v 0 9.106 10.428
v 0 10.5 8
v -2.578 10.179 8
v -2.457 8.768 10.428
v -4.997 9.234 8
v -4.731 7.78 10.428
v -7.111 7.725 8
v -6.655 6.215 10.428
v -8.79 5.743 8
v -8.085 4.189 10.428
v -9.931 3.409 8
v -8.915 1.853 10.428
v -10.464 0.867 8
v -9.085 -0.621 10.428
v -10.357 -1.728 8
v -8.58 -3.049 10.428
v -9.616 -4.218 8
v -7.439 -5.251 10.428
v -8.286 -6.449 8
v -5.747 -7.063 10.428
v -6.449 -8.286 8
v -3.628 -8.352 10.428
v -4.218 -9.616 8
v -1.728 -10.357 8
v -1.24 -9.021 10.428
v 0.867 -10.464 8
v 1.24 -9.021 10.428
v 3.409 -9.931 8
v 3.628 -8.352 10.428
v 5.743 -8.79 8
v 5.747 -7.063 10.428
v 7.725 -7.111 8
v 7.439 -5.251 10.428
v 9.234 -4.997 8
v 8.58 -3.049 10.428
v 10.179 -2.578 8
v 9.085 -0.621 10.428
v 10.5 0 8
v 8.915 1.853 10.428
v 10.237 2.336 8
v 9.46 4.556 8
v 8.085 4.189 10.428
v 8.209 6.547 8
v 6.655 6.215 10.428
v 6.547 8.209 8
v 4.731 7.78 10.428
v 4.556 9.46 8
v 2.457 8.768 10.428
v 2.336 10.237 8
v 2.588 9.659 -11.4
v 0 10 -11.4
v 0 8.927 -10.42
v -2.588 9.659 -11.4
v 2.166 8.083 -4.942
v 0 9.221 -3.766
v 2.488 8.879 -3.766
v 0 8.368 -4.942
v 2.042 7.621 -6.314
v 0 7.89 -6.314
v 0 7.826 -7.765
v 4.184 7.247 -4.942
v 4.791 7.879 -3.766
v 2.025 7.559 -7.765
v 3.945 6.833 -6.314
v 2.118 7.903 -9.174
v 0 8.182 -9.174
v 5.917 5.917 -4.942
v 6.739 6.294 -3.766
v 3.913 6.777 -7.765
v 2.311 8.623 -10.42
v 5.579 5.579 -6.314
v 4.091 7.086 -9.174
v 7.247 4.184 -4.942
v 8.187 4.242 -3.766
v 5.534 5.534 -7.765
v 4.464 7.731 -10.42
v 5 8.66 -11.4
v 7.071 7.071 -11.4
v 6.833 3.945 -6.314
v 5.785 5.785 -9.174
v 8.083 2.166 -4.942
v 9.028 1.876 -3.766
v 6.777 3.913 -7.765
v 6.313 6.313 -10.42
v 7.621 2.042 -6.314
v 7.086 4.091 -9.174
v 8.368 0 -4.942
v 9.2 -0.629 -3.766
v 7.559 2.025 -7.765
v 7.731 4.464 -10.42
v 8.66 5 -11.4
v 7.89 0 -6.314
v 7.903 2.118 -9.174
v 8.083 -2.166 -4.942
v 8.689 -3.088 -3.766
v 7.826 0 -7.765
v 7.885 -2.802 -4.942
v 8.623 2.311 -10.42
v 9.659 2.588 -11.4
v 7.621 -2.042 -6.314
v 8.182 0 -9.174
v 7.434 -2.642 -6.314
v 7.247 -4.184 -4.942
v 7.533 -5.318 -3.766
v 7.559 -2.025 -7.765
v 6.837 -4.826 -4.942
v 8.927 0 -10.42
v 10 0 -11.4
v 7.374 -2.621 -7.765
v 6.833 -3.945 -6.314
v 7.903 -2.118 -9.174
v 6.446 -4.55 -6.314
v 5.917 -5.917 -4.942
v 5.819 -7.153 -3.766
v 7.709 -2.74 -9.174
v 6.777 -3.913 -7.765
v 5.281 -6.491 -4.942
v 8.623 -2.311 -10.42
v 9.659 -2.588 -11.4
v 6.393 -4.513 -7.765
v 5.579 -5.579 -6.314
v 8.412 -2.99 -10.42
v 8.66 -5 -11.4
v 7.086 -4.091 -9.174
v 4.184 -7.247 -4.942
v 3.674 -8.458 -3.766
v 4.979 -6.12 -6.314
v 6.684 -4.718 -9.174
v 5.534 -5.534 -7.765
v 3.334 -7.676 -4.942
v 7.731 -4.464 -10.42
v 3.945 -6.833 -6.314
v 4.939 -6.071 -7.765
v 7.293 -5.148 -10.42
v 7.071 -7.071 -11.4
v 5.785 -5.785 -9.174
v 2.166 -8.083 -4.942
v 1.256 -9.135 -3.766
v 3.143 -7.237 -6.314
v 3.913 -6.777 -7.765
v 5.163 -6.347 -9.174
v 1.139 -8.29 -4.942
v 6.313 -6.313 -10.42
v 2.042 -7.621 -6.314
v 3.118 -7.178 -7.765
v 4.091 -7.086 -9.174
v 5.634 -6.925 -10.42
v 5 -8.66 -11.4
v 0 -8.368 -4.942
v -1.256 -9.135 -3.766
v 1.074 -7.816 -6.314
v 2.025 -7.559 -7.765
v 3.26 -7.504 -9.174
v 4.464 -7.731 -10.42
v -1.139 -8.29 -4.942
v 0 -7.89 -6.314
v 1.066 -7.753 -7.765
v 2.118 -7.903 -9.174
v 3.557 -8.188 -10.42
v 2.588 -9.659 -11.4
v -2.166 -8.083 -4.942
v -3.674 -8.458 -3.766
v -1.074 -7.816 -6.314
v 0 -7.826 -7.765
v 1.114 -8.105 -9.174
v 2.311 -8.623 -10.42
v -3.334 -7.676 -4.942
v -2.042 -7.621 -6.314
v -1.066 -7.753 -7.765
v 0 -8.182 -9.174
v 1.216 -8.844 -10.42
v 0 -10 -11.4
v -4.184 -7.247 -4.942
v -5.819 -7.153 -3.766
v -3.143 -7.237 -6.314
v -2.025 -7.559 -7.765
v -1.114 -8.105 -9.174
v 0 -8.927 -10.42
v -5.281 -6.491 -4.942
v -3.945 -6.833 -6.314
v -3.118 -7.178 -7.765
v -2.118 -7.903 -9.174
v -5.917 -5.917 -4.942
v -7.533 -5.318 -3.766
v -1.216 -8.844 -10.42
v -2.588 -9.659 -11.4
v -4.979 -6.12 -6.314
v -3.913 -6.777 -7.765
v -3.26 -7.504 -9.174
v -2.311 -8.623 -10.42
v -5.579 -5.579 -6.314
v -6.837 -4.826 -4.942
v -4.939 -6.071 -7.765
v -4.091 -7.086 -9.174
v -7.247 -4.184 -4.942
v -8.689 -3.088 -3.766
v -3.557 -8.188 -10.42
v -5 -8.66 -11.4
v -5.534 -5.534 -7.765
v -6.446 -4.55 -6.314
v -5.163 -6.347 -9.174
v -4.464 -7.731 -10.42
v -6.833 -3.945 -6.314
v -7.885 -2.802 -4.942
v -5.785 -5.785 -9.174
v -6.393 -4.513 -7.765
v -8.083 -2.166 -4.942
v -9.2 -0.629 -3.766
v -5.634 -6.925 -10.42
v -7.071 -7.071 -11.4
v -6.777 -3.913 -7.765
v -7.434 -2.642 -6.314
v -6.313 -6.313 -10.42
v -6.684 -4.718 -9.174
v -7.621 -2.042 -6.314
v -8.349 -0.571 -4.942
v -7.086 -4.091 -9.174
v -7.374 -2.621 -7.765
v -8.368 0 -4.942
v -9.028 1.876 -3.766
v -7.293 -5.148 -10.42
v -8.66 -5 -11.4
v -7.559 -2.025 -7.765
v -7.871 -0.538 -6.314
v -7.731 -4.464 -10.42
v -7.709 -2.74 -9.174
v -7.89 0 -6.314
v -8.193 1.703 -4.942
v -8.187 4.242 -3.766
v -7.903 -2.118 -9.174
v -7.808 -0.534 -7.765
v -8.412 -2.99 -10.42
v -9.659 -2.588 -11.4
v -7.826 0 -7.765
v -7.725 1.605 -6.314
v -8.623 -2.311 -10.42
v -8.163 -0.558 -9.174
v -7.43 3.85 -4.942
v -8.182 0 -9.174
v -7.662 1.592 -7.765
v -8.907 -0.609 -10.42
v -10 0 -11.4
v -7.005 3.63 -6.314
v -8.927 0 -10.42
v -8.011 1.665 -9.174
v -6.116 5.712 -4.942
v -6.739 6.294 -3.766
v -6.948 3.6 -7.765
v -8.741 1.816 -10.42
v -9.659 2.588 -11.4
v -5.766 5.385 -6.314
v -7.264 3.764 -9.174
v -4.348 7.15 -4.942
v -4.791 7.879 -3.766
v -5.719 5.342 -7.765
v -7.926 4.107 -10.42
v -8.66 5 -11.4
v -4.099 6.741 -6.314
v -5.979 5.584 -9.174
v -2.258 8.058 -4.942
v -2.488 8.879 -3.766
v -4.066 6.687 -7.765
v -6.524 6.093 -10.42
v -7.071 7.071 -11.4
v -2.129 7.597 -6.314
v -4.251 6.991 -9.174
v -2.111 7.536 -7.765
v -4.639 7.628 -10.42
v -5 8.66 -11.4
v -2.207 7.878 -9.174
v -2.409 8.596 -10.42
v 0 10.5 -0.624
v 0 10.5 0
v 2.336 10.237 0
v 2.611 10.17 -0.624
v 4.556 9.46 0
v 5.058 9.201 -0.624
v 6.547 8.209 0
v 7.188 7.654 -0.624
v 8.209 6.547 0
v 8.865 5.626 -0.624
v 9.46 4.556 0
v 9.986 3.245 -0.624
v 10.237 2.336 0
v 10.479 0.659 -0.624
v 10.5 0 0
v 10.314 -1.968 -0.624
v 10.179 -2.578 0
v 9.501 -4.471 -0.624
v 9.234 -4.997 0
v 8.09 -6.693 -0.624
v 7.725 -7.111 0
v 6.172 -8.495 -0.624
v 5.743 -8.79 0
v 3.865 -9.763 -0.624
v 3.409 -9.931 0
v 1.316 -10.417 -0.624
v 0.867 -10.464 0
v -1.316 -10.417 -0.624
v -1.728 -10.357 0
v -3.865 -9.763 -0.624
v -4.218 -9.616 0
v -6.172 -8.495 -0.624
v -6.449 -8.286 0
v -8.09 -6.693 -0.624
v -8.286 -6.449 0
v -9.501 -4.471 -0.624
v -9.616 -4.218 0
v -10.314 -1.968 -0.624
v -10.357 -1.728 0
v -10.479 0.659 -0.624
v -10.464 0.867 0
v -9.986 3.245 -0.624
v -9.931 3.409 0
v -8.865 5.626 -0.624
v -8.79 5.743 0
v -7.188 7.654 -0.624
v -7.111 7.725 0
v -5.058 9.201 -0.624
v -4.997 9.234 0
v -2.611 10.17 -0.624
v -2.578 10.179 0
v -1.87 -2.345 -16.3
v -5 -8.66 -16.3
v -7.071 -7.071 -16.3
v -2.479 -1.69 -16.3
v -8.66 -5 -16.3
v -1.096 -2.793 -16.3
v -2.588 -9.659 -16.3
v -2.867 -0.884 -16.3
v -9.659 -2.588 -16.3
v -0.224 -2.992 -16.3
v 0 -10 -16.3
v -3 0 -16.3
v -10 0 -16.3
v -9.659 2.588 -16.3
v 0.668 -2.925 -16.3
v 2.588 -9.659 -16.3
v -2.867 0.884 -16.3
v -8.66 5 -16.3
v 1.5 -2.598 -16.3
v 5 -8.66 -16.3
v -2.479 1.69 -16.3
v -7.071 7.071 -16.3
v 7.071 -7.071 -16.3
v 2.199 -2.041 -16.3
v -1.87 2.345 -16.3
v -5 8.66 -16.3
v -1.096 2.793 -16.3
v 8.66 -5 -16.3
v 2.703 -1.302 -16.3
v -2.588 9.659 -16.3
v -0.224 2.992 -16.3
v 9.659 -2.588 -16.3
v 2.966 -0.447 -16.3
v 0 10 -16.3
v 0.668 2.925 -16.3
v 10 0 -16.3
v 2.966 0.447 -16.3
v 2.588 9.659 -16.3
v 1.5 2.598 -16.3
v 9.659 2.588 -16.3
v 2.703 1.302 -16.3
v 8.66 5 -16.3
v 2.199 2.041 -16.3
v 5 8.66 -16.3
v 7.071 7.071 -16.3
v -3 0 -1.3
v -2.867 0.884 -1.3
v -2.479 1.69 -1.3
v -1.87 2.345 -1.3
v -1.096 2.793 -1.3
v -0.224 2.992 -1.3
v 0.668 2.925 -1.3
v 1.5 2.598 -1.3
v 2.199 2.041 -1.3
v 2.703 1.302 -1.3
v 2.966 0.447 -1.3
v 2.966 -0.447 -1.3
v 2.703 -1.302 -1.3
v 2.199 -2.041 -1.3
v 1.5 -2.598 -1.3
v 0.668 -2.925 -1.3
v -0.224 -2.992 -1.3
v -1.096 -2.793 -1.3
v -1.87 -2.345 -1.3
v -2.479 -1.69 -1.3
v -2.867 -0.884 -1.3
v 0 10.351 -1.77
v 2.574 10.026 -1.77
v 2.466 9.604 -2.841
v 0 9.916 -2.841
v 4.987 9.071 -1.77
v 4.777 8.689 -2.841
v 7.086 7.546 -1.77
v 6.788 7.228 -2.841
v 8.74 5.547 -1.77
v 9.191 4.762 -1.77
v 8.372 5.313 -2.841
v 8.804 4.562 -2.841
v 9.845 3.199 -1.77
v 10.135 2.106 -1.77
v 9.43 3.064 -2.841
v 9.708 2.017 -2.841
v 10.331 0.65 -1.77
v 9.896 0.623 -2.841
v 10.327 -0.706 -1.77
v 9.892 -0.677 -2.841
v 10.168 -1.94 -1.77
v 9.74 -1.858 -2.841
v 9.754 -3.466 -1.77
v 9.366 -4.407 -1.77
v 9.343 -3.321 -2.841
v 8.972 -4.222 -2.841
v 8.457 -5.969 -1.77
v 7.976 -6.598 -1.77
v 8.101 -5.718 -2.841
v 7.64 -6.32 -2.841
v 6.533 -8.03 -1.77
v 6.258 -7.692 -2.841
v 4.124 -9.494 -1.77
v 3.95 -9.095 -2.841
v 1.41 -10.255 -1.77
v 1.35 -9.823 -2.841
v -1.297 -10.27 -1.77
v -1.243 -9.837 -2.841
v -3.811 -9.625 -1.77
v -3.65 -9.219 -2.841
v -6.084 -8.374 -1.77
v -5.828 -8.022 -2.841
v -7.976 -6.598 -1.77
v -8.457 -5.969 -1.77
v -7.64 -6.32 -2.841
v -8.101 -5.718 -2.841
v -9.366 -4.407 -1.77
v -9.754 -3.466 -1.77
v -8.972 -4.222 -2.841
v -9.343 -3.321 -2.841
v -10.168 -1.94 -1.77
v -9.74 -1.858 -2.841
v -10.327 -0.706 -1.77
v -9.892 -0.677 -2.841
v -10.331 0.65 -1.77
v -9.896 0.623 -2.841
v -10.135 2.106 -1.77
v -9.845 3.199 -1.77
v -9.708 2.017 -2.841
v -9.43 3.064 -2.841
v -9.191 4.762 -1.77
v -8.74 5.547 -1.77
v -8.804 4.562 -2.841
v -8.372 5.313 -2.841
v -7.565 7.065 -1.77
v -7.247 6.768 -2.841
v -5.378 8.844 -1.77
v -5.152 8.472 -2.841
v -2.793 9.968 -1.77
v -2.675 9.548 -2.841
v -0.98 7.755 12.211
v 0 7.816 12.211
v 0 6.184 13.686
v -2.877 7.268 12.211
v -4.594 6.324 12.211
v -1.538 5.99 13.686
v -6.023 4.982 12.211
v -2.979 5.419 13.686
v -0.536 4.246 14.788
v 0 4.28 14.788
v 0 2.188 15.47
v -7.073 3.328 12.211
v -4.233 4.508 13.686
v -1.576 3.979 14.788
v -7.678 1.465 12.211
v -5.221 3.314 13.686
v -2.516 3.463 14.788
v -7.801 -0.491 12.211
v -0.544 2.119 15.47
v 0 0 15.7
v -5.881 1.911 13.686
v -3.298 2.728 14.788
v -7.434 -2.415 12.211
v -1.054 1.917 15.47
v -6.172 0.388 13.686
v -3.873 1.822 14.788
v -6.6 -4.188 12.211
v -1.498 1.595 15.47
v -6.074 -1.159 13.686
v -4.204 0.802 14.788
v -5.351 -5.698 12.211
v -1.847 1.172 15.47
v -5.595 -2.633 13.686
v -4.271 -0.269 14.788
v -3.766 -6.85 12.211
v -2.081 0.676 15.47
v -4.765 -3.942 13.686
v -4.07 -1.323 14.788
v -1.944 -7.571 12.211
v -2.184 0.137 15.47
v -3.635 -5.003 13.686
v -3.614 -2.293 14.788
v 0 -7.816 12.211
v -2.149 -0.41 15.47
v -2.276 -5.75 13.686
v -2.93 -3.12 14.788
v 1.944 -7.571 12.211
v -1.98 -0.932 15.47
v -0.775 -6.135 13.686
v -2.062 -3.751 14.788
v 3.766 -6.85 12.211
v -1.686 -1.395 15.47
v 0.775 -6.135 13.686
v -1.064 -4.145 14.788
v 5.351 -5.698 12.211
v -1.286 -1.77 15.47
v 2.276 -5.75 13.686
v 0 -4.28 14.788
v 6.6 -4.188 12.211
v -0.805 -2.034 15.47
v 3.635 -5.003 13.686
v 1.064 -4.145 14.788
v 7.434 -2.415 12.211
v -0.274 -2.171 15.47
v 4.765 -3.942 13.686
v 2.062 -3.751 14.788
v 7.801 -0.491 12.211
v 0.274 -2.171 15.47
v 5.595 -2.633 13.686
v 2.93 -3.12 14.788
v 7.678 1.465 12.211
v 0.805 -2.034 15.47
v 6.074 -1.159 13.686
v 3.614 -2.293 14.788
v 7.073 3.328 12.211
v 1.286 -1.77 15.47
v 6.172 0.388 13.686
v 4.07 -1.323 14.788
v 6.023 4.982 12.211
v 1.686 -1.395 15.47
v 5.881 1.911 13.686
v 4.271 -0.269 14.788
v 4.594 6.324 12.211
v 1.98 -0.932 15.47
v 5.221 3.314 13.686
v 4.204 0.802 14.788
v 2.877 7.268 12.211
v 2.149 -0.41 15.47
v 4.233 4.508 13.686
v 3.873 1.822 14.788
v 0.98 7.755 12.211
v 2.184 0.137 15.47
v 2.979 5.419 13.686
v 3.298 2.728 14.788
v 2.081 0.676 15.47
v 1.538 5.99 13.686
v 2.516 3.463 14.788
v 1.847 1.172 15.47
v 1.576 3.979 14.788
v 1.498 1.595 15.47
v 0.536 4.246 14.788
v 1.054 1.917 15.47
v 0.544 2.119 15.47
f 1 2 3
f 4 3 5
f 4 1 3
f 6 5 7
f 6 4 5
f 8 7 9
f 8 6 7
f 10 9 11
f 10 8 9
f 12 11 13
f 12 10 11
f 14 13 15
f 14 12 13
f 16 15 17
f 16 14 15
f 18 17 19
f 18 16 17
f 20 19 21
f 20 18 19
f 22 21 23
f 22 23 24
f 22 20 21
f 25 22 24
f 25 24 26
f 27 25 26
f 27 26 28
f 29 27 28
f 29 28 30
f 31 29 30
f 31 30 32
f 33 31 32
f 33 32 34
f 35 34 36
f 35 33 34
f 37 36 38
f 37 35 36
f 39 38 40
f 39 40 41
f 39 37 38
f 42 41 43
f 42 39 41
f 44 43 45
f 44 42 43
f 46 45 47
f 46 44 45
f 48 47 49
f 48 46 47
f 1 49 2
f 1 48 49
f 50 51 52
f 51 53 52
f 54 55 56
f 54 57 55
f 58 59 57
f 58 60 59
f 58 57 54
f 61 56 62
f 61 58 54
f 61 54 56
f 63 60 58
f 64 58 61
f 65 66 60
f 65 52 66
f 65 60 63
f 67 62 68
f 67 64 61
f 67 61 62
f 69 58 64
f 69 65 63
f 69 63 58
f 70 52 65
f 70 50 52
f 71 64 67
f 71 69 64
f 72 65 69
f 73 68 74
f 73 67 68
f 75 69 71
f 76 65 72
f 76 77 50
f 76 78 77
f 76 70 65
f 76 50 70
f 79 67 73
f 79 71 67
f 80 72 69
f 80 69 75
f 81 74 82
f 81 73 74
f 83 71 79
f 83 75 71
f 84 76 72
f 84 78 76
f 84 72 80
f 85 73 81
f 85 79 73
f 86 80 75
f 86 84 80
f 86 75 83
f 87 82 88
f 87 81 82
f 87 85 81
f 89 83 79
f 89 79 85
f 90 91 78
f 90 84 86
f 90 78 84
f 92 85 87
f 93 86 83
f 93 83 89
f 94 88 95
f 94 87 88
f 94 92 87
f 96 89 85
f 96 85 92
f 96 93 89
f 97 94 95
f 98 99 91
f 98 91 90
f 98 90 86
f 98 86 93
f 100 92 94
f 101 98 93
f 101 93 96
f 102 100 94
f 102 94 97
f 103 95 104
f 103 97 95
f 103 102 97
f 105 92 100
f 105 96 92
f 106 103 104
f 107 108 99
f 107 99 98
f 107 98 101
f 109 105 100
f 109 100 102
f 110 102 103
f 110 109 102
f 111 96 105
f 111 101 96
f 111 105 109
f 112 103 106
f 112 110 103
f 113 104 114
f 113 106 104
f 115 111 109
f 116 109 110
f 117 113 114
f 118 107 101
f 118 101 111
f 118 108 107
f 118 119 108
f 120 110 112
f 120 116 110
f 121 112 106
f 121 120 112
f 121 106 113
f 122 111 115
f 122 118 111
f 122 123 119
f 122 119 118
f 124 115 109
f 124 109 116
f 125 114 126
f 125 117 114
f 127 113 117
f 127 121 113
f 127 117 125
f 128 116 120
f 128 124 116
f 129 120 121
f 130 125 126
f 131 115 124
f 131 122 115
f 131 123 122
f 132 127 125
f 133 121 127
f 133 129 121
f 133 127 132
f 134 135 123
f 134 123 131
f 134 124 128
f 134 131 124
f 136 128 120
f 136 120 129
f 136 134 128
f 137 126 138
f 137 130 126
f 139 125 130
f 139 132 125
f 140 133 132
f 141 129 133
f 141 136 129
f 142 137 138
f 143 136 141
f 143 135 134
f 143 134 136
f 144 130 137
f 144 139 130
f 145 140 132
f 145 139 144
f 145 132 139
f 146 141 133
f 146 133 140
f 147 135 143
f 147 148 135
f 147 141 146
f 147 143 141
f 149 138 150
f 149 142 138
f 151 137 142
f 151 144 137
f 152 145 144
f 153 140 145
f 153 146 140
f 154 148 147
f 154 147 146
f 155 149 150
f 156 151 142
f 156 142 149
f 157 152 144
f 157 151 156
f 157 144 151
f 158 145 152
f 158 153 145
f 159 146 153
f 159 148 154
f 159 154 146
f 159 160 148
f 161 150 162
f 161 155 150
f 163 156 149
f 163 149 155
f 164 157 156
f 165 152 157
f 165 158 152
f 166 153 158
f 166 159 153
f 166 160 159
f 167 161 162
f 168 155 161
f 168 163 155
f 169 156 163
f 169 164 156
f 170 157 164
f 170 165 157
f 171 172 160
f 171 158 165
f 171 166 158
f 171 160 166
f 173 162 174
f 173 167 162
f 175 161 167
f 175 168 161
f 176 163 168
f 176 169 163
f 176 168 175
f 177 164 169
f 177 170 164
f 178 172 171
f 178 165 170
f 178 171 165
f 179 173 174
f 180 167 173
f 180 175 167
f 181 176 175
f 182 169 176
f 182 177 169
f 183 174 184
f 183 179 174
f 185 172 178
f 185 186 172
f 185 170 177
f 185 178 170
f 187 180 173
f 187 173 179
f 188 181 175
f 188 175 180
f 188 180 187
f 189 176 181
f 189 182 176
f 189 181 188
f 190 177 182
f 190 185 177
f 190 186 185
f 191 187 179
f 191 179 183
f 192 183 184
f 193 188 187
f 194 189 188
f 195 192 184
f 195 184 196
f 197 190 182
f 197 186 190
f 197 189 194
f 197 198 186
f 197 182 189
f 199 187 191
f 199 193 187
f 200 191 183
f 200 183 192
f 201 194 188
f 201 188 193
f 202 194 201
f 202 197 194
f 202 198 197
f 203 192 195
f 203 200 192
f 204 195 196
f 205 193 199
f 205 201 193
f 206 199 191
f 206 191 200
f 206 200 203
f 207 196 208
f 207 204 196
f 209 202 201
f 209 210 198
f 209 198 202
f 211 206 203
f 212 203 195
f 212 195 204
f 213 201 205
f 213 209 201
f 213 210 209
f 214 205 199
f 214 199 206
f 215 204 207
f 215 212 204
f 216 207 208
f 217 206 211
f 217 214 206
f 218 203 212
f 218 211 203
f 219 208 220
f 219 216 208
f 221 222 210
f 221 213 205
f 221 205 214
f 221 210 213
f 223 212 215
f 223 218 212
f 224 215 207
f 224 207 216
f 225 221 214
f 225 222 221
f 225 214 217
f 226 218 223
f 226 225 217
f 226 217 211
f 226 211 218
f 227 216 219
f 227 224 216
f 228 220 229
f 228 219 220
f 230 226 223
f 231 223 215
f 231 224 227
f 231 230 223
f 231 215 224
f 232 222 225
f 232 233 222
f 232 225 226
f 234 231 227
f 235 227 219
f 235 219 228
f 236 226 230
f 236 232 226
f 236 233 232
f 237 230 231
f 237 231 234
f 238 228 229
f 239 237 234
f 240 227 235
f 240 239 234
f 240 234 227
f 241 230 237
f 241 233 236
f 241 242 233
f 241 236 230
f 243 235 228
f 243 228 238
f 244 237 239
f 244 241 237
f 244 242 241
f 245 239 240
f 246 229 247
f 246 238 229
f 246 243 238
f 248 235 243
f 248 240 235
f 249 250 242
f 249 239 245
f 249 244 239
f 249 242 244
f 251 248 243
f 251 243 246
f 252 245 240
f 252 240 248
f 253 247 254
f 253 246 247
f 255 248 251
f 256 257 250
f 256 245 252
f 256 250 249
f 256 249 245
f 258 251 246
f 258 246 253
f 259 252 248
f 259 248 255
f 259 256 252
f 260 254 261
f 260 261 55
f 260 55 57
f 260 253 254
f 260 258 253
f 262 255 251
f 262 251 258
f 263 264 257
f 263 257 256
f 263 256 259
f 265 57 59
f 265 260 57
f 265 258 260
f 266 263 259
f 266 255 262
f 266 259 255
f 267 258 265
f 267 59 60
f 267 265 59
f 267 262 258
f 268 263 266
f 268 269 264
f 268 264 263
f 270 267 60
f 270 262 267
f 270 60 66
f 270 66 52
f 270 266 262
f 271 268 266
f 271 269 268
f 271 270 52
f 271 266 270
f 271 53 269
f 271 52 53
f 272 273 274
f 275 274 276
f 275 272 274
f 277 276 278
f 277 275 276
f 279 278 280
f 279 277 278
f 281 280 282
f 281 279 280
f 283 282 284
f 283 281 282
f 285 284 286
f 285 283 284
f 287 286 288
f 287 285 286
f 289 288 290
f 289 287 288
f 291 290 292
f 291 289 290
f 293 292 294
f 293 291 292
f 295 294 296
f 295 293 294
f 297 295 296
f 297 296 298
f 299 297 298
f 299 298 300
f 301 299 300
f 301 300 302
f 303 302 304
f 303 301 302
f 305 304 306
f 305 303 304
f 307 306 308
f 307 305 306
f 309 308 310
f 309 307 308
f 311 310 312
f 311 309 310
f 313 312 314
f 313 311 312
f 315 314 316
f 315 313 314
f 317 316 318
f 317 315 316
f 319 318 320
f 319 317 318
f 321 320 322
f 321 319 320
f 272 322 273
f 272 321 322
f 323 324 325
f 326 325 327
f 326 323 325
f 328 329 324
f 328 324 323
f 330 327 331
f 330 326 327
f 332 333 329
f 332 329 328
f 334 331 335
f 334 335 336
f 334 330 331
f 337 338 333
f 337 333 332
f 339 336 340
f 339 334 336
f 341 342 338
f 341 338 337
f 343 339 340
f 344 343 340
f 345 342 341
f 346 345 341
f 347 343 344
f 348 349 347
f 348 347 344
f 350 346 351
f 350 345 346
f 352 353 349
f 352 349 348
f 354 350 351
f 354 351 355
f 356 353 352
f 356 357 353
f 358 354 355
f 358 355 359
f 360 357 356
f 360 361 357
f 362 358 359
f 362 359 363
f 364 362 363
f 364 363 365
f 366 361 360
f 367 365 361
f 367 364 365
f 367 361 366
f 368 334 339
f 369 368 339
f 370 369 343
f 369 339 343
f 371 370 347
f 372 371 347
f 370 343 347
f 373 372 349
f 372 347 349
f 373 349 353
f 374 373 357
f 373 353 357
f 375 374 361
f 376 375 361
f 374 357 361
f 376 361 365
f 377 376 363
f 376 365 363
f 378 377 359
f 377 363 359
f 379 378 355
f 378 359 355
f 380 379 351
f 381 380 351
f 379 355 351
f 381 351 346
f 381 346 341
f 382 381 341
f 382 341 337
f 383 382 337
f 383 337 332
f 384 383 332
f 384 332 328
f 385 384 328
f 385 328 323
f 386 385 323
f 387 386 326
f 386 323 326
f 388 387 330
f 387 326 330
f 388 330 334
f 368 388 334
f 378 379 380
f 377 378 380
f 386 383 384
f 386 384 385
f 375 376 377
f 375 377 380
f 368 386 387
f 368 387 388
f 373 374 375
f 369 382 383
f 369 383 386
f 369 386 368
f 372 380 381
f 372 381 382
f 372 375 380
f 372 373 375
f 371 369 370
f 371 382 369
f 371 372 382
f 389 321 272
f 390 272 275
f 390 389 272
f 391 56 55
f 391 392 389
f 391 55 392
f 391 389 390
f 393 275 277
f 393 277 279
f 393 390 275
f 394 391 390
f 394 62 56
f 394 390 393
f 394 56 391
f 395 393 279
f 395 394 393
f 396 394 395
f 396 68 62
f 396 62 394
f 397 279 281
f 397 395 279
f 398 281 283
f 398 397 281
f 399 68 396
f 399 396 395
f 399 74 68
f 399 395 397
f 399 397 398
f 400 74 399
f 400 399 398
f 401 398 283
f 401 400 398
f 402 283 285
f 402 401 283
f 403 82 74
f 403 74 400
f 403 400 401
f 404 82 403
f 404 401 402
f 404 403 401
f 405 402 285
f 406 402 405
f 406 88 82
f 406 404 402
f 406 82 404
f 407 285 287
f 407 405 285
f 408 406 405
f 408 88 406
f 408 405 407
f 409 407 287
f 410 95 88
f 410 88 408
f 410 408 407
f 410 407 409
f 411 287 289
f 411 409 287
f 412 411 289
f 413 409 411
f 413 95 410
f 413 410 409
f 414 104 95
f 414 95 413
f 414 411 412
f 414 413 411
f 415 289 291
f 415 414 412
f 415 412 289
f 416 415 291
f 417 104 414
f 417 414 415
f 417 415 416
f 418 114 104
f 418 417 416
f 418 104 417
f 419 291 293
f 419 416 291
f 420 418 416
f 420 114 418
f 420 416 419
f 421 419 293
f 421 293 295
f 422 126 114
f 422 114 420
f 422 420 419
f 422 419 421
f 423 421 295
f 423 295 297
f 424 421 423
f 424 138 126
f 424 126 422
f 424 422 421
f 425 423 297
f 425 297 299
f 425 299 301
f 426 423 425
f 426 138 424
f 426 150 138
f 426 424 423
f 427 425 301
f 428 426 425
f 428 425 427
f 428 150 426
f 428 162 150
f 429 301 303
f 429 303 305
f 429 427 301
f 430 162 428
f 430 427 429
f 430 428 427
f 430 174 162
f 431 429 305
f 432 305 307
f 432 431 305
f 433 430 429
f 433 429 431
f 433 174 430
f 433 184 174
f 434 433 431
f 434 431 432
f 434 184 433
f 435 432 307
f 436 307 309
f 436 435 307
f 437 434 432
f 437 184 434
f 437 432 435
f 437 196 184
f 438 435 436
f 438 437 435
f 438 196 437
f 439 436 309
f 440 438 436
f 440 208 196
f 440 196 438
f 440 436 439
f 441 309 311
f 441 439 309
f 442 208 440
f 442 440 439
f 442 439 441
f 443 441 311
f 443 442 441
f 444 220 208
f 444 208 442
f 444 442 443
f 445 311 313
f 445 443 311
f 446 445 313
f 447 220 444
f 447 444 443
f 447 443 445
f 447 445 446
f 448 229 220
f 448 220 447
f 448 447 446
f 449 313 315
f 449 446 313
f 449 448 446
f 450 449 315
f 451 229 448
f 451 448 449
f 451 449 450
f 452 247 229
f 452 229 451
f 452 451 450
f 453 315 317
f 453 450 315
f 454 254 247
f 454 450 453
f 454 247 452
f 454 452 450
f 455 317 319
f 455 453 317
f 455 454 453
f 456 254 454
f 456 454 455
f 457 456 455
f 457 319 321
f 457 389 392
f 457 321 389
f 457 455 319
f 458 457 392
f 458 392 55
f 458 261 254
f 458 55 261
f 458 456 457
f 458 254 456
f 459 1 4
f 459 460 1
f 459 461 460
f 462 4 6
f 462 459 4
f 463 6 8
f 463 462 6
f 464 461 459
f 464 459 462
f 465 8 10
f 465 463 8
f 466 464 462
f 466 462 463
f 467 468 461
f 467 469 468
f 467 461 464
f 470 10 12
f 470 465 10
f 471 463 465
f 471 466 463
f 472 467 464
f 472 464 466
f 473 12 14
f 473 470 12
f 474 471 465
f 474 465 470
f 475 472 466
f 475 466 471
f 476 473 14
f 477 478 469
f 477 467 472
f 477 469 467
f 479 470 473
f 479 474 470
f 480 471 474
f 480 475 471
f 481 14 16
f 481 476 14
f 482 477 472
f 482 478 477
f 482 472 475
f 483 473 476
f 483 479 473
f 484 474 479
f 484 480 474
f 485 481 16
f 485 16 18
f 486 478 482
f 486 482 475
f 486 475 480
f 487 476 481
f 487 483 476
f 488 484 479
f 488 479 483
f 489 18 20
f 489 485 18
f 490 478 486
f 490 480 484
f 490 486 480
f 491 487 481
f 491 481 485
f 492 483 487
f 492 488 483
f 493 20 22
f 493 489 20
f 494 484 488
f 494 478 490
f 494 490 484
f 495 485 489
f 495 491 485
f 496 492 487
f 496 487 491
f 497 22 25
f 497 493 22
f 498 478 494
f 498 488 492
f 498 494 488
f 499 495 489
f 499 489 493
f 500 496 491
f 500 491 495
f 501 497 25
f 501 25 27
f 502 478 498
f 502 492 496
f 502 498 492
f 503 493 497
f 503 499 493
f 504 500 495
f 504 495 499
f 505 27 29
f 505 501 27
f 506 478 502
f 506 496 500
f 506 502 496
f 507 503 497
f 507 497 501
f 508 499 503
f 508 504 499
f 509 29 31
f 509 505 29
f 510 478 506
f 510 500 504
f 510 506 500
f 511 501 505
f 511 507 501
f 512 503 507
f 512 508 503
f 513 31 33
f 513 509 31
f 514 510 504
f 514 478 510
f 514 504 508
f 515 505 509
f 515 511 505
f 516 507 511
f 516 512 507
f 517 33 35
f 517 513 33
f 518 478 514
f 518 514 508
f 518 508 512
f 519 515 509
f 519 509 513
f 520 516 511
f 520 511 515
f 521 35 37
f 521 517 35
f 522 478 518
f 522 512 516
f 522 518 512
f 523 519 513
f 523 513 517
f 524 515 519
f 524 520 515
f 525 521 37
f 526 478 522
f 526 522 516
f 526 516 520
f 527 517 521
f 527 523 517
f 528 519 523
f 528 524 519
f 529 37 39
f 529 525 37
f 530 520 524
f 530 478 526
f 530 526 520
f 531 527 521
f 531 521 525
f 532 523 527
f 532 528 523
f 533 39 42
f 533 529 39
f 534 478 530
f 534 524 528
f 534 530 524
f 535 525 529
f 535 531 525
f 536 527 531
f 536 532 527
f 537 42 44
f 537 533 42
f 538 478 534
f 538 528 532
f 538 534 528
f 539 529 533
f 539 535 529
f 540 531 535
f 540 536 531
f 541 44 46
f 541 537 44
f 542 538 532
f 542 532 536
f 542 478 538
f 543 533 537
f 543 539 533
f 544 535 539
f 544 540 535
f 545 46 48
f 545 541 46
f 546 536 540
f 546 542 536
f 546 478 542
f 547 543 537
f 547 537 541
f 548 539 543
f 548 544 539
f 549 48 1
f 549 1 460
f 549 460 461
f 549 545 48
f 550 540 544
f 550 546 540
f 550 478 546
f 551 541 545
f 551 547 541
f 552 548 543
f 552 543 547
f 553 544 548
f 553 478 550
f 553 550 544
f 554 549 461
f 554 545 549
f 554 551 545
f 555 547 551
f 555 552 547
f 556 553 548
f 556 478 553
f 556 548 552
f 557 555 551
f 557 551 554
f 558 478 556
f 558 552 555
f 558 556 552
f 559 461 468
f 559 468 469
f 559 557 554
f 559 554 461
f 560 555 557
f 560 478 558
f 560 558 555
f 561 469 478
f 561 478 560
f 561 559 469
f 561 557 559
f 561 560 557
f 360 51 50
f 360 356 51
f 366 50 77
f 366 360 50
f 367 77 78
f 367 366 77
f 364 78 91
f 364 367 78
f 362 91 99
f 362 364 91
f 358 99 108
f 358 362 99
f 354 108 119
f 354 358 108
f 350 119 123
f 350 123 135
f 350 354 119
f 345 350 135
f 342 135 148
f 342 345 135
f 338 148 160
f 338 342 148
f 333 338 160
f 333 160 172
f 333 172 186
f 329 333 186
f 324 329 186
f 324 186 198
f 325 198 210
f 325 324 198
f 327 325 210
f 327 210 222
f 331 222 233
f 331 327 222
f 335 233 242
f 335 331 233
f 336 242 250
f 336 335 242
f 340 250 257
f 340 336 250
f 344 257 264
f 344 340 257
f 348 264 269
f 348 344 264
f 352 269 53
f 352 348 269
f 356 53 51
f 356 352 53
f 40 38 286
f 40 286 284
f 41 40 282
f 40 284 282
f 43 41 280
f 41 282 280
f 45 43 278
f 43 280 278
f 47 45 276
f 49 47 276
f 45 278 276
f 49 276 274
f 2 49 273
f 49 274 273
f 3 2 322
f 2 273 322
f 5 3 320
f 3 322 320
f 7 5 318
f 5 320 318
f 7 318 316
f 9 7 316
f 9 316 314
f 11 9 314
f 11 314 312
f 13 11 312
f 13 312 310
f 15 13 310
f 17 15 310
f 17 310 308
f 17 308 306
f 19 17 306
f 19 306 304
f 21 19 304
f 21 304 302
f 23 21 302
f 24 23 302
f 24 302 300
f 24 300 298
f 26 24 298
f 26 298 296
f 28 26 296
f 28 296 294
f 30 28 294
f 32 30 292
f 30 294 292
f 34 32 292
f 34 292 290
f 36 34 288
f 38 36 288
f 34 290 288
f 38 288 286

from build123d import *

# Parameters (mm, degrees)
CROQUIS1_R              = 10.5
SALIENTE_EXTRUIR1_DEPTH = 8
CROQUIS5_R              = 3
CORTAR_EXTRUIR1_DEPTH   = 15


with BuildPart() as part:
    # Croquis1 → Saliente-Extruir1 (new body)
    with BuildSketch(Plane.XY):
        Circle(CROQUIS1_R)
    extrude(amount=SALIENTE_EXTRUIR1_DEPTH)

    # Croquis3 → Revolución1 (revolve)
    with BuildSketch(Plane(origin=(0, 0, 0), x_dir=(0, 0, -1), z_dir=(1, 0, 0))):
        with BuildLine():
            Line((-8, 10.5), (-10.428215768, 9.105809129))
            ThreePointArc((-10.428215768, 9.105809129), (-14.286975998, 5.260880841), (-15.7, 0))
            Line((-15.7, 0), (-8, 0))
            Line((-8, 0), (-8, 10.5))
        make_face()
    revolve(axis=Axis((0, 0, 8), (0, 0, 1)))

    # Croquis4 → Revolución2 (revolve)
    with BuildSketch(Plane(origin=(0, 0, 0), x_dir=(0, 0, -1), z_dir=(1, 0, 0))):
        with BuildLine():
            Line((0, 0), (0, 10.5))
            Line((0, 10.5), (0.623533648, 10.5))
            ThreePointArc((0.623533648, 10.5), (2.319891977, 10.168017325), (3.765956272, 9.221052632))
            ThreePointArc((3.765956272, 9.221052632), (7.765081748, 7.825826873), (11.4, 10))
            Line((11.4, 10), (16.3, 10))
            Line((16.3, 10), (16.3, 0))
            Line((16.3, 0), (0, 0))
        make_face()
    revolve(axis=Axis((0, 0, 0), (0, 0, -1)))

    # Croquis5 → Cortar-Extruir1 (cut)
    with BuildSketch(Plane(origin=(0, 0, -16.3), x_dir=(-1, 0, 0), z_dir=(0, 0, -1))):
        Circle(CROQUIS5_R)
    extrude(amount=-CORTAR_EXTRUIR1_DEPTH, mode=Mode.SUBTRACT)


solid = part.part
